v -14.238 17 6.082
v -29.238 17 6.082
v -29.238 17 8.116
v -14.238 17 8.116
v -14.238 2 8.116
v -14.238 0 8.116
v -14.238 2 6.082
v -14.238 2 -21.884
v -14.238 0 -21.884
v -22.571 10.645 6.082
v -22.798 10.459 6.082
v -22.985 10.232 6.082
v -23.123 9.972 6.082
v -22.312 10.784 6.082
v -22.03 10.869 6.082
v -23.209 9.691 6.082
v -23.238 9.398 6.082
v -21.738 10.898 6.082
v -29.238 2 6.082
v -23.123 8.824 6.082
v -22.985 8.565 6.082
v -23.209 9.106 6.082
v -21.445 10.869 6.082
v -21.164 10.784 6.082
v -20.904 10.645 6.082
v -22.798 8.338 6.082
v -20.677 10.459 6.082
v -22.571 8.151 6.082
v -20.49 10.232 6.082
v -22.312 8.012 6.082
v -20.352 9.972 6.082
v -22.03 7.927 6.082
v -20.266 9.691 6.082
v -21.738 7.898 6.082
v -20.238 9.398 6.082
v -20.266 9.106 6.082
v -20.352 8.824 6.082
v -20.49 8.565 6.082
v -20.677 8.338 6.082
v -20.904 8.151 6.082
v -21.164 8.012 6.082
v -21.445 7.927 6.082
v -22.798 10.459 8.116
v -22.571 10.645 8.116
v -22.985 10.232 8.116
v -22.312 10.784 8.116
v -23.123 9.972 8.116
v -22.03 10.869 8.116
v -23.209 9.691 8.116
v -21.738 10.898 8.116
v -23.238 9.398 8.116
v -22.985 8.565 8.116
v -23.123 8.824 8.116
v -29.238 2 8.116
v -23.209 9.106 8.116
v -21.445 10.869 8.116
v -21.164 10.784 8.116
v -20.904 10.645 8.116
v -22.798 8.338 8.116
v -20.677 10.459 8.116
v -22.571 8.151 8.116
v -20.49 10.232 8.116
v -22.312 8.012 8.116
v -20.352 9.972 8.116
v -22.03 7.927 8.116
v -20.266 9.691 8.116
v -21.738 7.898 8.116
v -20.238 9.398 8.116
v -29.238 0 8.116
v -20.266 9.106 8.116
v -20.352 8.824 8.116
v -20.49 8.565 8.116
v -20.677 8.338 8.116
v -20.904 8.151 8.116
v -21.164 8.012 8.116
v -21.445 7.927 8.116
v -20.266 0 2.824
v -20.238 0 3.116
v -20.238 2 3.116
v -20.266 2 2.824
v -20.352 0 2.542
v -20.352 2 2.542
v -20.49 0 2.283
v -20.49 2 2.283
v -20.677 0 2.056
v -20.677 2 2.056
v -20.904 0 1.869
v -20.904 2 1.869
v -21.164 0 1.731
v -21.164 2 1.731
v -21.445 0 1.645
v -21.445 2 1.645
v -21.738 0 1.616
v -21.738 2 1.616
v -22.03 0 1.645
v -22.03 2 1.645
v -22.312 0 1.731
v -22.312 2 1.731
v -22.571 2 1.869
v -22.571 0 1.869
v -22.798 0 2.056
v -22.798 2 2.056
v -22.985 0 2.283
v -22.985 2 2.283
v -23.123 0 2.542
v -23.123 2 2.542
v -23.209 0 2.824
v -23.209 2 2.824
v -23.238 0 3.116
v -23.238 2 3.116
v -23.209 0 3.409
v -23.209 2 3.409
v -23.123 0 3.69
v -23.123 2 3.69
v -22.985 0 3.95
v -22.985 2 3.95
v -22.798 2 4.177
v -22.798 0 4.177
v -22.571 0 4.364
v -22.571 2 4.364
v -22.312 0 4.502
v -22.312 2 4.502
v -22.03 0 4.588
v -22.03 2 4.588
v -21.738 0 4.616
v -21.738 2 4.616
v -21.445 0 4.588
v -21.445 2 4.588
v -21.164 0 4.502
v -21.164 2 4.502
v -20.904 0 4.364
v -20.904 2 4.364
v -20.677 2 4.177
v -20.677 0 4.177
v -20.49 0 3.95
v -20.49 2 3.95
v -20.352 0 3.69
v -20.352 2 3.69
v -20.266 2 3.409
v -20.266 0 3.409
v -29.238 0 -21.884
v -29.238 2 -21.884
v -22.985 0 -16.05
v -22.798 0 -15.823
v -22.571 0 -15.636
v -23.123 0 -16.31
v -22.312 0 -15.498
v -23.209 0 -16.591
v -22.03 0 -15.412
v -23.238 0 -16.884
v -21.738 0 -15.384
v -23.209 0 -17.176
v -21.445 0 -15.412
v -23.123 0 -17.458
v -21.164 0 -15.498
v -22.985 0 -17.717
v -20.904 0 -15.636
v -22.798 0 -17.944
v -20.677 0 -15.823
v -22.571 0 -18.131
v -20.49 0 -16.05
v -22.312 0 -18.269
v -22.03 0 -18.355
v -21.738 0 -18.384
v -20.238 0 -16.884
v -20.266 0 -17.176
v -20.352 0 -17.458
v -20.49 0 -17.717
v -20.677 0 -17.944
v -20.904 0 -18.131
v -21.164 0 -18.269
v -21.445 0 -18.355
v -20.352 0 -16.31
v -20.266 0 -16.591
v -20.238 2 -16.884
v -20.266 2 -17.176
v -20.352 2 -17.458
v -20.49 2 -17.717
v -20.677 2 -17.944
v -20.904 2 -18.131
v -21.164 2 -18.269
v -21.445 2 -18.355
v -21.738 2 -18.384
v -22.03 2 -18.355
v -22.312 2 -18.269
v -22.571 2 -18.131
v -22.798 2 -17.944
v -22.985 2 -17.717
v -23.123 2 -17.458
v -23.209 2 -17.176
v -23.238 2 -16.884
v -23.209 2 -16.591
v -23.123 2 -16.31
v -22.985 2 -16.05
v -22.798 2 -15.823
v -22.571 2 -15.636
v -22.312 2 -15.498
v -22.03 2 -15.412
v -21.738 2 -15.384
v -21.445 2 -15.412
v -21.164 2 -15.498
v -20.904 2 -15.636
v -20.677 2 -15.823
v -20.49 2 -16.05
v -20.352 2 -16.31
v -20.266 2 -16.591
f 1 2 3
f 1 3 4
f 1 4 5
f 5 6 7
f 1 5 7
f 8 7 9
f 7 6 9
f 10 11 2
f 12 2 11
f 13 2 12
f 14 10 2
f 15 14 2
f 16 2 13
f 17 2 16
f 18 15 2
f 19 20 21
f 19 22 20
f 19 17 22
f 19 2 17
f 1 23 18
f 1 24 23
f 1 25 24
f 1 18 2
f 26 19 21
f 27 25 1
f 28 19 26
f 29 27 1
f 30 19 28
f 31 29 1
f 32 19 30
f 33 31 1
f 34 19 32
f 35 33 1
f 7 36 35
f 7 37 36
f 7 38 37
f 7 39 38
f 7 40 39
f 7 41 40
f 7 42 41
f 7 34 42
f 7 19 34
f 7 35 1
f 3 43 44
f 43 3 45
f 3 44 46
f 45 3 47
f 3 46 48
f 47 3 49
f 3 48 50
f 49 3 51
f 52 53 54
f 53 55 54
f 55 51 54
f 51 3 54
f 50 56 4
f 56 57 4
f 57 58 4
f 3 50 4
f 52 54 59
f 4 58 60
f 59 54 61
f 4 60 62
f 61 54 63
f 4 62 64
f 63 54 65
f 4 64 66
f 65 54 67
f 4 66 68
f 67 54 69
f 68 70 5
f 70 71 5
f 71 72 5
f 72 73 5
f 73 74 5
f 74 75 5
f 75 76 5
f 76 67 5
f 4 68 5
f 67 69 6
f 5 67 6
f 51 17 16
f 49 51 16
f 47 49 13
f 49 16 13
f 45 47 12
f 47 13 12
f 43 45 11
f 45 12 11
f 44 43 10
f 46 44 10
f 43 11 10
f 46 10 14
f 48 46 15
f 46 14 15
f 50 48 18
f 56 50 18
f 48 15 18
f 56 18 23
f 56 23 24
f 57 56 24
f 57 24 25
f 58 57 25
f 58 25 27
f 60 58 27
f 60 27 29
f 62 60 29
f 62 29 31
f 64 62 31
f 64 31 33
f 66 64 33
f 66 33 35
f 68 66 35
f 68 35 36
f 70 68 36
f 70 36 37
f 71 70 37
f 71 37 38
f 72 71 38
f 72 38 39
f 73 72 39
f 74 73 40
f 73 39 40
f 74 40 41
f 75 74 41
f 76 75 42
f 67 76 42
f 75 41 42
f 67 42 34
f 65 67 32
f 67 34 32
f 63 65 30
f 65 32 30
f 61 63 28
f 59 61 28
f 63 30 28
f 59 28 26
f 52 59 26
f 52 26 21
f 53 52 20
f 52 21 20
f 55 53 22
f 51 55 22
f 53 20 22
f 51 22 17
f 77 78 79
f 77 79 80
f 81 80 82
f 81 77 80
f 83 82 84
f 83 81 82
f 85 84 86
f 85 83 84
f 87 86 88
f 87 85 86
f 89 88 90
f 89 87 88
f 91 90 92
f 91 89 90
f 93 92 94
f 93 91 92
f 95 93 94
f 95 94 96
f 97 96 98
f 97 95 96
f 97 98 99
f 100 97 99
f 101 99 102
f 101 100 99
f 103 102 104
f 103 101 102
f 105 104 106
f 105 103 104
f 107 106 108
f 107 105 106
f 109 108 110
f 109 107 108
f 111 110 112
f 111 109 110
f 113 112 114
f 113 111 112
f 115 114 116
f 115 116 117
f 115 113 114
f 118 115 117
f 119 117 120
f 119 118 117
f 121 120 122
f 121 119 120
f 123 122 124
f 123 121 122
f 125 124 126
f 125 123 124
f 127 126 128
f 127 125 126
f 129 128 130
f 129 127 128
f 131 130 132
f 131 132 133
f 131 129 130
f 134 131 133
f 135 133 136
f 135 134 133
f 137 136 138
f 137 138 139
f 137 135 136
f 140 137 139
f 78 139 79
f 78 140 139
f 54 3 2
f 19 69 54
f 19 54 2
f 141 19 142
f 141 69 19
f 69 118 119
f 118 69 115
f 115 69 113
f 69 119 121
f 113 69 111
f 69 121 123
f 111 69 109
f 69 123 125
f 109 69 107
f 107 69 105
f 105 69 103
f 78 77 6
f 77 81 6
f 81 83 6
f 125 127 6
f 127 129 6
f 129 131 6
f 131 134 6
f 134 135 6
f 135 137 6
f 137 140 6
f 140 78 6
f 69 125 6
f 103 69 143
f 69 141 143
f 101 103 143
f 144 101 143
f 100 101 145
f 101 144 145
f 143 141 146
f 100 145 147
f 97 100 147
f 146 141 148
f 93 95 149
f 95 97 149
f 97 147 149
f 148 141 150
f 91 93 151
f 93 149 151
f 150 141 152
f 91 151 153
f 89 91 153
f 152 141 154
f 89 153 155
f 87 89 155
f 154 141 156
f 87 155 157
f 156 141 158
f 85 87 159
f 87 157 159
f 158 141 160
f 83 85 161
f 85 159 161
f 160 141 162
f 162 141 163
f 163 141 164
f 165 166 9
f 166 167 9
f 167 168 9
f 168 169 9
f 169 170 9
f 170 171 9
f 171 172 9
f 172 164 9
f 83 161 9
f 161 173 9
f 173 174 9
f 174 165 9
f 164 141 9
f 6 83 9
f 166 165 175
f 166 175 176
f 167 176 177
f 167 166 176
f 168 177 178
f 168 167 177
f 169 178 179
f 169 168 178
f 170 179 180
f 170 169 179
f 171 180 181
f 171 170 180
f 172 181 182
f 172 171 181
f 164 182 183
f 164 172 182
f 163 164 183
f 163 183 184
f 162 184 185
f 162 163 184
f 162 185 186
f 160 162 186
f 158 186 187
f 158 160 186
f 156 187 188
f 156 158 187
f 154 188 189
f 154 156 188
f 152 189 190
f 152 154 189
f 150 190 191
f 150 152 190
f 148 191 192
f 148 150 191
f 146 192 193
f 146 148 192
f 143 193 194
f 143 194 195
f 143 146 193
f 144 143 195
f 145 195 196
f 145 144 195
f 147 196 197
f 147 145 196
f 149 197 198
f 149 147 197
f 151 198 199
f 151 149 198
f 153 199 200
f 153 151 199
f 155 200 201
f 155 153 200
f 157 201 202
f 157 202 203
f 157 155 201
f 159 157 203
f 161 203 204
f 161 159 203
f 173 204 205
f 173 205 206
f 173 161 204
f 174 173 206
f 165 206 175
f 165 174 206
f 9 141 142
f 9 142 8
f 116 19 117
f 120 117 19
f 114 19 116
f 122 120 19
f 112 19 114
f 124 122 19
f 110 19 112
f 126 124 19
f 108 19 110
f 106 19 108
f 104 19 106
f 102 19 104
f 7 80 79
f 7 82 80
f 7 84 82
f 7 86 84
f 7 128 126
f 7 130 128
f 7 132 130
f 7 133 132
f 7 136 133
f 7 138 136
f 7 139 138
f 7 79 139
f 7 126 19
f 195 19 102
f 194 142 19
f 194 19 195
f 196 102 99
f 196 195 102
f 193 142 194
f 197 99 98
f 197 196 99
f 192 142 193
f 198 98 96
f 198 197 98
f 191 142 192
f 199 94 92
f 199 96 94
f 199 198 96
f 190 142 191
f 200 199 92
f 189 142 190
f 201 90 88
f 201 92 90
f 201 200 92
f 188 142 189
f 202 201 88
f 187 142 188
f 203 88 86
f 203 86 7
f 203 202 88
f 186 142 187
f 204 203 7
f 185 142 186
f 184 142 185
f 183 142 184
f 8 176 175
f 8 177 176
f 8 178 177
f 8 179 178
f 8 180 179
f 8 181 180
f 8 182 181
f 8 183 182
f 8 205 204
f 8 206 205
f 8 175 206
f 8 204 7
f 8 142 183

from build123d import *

# Parameters (mm, degrees)
SKETCH1_W           = 15
SKETCH1_H           = 30
SKETCH1_R           = 1.5
BOSS_EXTRUDE1_DEPTH = 2
SKETCH3_W           = 15
SKETCH3_H           = 2.034817015
BOSS_EXTRUDE2_DEPTH = 15
SKETCH4_R           = 1.5
CUT_EXTRUDE1_DEPTH  = 15


with BuildPart() as part:
    # Sketch1 → Boss-Extrude1 (new body)
    with BuildSketch(Plane(origin=(0, 0, 0), x_dir=(1, 0, 0), z_dir=(0, 1, 0))):
        with Locations((-21.737545239, 6.883664284)):
            Rectangle(SKETCH1_W, SKETCH1_H)
        with Locations((-21.737545239, 16.883664284)):
            Circle(SKETCH1_R, mode=Mode.SUBTRACT)
        with Locations((-21.737545239, -3.116335716)):
            Circle(SKETCH1_R, mode=Mode.SUBTRACT)
    extrude(amount=BOSS_EXTRUDE1_DEPTH)

    # Sketch3 → Boss-Extrude2 (add)
    with BuildSketch(Plane(origin=(0, 2, 0), x_dir=(1, 0, 0), z_dir=(0, 1, 0))):
        with Locations((-21.737545239, -7.098927209)):
            Rectangle(SKETCH3_W, SKETCH3_H)
    extrude(amount=BOSS_EXTRUDE2_DEPTH)

    # Sketch4 → Cut-Extrude1 (cut)
    with BuildSketch(Plane(origin=(0, 0, 6.081518701), x_dir=(-1, 0, 0), z_dir=(0, 0, -1))):
        with Locations((21.737545239, 9.398162072)):
            Circle(SKETCH4_R)
    extrude(amount=-CUT_EXTRUDE1_DEPTH, mode=Mode.SUBTRACT)


solid = part.part
